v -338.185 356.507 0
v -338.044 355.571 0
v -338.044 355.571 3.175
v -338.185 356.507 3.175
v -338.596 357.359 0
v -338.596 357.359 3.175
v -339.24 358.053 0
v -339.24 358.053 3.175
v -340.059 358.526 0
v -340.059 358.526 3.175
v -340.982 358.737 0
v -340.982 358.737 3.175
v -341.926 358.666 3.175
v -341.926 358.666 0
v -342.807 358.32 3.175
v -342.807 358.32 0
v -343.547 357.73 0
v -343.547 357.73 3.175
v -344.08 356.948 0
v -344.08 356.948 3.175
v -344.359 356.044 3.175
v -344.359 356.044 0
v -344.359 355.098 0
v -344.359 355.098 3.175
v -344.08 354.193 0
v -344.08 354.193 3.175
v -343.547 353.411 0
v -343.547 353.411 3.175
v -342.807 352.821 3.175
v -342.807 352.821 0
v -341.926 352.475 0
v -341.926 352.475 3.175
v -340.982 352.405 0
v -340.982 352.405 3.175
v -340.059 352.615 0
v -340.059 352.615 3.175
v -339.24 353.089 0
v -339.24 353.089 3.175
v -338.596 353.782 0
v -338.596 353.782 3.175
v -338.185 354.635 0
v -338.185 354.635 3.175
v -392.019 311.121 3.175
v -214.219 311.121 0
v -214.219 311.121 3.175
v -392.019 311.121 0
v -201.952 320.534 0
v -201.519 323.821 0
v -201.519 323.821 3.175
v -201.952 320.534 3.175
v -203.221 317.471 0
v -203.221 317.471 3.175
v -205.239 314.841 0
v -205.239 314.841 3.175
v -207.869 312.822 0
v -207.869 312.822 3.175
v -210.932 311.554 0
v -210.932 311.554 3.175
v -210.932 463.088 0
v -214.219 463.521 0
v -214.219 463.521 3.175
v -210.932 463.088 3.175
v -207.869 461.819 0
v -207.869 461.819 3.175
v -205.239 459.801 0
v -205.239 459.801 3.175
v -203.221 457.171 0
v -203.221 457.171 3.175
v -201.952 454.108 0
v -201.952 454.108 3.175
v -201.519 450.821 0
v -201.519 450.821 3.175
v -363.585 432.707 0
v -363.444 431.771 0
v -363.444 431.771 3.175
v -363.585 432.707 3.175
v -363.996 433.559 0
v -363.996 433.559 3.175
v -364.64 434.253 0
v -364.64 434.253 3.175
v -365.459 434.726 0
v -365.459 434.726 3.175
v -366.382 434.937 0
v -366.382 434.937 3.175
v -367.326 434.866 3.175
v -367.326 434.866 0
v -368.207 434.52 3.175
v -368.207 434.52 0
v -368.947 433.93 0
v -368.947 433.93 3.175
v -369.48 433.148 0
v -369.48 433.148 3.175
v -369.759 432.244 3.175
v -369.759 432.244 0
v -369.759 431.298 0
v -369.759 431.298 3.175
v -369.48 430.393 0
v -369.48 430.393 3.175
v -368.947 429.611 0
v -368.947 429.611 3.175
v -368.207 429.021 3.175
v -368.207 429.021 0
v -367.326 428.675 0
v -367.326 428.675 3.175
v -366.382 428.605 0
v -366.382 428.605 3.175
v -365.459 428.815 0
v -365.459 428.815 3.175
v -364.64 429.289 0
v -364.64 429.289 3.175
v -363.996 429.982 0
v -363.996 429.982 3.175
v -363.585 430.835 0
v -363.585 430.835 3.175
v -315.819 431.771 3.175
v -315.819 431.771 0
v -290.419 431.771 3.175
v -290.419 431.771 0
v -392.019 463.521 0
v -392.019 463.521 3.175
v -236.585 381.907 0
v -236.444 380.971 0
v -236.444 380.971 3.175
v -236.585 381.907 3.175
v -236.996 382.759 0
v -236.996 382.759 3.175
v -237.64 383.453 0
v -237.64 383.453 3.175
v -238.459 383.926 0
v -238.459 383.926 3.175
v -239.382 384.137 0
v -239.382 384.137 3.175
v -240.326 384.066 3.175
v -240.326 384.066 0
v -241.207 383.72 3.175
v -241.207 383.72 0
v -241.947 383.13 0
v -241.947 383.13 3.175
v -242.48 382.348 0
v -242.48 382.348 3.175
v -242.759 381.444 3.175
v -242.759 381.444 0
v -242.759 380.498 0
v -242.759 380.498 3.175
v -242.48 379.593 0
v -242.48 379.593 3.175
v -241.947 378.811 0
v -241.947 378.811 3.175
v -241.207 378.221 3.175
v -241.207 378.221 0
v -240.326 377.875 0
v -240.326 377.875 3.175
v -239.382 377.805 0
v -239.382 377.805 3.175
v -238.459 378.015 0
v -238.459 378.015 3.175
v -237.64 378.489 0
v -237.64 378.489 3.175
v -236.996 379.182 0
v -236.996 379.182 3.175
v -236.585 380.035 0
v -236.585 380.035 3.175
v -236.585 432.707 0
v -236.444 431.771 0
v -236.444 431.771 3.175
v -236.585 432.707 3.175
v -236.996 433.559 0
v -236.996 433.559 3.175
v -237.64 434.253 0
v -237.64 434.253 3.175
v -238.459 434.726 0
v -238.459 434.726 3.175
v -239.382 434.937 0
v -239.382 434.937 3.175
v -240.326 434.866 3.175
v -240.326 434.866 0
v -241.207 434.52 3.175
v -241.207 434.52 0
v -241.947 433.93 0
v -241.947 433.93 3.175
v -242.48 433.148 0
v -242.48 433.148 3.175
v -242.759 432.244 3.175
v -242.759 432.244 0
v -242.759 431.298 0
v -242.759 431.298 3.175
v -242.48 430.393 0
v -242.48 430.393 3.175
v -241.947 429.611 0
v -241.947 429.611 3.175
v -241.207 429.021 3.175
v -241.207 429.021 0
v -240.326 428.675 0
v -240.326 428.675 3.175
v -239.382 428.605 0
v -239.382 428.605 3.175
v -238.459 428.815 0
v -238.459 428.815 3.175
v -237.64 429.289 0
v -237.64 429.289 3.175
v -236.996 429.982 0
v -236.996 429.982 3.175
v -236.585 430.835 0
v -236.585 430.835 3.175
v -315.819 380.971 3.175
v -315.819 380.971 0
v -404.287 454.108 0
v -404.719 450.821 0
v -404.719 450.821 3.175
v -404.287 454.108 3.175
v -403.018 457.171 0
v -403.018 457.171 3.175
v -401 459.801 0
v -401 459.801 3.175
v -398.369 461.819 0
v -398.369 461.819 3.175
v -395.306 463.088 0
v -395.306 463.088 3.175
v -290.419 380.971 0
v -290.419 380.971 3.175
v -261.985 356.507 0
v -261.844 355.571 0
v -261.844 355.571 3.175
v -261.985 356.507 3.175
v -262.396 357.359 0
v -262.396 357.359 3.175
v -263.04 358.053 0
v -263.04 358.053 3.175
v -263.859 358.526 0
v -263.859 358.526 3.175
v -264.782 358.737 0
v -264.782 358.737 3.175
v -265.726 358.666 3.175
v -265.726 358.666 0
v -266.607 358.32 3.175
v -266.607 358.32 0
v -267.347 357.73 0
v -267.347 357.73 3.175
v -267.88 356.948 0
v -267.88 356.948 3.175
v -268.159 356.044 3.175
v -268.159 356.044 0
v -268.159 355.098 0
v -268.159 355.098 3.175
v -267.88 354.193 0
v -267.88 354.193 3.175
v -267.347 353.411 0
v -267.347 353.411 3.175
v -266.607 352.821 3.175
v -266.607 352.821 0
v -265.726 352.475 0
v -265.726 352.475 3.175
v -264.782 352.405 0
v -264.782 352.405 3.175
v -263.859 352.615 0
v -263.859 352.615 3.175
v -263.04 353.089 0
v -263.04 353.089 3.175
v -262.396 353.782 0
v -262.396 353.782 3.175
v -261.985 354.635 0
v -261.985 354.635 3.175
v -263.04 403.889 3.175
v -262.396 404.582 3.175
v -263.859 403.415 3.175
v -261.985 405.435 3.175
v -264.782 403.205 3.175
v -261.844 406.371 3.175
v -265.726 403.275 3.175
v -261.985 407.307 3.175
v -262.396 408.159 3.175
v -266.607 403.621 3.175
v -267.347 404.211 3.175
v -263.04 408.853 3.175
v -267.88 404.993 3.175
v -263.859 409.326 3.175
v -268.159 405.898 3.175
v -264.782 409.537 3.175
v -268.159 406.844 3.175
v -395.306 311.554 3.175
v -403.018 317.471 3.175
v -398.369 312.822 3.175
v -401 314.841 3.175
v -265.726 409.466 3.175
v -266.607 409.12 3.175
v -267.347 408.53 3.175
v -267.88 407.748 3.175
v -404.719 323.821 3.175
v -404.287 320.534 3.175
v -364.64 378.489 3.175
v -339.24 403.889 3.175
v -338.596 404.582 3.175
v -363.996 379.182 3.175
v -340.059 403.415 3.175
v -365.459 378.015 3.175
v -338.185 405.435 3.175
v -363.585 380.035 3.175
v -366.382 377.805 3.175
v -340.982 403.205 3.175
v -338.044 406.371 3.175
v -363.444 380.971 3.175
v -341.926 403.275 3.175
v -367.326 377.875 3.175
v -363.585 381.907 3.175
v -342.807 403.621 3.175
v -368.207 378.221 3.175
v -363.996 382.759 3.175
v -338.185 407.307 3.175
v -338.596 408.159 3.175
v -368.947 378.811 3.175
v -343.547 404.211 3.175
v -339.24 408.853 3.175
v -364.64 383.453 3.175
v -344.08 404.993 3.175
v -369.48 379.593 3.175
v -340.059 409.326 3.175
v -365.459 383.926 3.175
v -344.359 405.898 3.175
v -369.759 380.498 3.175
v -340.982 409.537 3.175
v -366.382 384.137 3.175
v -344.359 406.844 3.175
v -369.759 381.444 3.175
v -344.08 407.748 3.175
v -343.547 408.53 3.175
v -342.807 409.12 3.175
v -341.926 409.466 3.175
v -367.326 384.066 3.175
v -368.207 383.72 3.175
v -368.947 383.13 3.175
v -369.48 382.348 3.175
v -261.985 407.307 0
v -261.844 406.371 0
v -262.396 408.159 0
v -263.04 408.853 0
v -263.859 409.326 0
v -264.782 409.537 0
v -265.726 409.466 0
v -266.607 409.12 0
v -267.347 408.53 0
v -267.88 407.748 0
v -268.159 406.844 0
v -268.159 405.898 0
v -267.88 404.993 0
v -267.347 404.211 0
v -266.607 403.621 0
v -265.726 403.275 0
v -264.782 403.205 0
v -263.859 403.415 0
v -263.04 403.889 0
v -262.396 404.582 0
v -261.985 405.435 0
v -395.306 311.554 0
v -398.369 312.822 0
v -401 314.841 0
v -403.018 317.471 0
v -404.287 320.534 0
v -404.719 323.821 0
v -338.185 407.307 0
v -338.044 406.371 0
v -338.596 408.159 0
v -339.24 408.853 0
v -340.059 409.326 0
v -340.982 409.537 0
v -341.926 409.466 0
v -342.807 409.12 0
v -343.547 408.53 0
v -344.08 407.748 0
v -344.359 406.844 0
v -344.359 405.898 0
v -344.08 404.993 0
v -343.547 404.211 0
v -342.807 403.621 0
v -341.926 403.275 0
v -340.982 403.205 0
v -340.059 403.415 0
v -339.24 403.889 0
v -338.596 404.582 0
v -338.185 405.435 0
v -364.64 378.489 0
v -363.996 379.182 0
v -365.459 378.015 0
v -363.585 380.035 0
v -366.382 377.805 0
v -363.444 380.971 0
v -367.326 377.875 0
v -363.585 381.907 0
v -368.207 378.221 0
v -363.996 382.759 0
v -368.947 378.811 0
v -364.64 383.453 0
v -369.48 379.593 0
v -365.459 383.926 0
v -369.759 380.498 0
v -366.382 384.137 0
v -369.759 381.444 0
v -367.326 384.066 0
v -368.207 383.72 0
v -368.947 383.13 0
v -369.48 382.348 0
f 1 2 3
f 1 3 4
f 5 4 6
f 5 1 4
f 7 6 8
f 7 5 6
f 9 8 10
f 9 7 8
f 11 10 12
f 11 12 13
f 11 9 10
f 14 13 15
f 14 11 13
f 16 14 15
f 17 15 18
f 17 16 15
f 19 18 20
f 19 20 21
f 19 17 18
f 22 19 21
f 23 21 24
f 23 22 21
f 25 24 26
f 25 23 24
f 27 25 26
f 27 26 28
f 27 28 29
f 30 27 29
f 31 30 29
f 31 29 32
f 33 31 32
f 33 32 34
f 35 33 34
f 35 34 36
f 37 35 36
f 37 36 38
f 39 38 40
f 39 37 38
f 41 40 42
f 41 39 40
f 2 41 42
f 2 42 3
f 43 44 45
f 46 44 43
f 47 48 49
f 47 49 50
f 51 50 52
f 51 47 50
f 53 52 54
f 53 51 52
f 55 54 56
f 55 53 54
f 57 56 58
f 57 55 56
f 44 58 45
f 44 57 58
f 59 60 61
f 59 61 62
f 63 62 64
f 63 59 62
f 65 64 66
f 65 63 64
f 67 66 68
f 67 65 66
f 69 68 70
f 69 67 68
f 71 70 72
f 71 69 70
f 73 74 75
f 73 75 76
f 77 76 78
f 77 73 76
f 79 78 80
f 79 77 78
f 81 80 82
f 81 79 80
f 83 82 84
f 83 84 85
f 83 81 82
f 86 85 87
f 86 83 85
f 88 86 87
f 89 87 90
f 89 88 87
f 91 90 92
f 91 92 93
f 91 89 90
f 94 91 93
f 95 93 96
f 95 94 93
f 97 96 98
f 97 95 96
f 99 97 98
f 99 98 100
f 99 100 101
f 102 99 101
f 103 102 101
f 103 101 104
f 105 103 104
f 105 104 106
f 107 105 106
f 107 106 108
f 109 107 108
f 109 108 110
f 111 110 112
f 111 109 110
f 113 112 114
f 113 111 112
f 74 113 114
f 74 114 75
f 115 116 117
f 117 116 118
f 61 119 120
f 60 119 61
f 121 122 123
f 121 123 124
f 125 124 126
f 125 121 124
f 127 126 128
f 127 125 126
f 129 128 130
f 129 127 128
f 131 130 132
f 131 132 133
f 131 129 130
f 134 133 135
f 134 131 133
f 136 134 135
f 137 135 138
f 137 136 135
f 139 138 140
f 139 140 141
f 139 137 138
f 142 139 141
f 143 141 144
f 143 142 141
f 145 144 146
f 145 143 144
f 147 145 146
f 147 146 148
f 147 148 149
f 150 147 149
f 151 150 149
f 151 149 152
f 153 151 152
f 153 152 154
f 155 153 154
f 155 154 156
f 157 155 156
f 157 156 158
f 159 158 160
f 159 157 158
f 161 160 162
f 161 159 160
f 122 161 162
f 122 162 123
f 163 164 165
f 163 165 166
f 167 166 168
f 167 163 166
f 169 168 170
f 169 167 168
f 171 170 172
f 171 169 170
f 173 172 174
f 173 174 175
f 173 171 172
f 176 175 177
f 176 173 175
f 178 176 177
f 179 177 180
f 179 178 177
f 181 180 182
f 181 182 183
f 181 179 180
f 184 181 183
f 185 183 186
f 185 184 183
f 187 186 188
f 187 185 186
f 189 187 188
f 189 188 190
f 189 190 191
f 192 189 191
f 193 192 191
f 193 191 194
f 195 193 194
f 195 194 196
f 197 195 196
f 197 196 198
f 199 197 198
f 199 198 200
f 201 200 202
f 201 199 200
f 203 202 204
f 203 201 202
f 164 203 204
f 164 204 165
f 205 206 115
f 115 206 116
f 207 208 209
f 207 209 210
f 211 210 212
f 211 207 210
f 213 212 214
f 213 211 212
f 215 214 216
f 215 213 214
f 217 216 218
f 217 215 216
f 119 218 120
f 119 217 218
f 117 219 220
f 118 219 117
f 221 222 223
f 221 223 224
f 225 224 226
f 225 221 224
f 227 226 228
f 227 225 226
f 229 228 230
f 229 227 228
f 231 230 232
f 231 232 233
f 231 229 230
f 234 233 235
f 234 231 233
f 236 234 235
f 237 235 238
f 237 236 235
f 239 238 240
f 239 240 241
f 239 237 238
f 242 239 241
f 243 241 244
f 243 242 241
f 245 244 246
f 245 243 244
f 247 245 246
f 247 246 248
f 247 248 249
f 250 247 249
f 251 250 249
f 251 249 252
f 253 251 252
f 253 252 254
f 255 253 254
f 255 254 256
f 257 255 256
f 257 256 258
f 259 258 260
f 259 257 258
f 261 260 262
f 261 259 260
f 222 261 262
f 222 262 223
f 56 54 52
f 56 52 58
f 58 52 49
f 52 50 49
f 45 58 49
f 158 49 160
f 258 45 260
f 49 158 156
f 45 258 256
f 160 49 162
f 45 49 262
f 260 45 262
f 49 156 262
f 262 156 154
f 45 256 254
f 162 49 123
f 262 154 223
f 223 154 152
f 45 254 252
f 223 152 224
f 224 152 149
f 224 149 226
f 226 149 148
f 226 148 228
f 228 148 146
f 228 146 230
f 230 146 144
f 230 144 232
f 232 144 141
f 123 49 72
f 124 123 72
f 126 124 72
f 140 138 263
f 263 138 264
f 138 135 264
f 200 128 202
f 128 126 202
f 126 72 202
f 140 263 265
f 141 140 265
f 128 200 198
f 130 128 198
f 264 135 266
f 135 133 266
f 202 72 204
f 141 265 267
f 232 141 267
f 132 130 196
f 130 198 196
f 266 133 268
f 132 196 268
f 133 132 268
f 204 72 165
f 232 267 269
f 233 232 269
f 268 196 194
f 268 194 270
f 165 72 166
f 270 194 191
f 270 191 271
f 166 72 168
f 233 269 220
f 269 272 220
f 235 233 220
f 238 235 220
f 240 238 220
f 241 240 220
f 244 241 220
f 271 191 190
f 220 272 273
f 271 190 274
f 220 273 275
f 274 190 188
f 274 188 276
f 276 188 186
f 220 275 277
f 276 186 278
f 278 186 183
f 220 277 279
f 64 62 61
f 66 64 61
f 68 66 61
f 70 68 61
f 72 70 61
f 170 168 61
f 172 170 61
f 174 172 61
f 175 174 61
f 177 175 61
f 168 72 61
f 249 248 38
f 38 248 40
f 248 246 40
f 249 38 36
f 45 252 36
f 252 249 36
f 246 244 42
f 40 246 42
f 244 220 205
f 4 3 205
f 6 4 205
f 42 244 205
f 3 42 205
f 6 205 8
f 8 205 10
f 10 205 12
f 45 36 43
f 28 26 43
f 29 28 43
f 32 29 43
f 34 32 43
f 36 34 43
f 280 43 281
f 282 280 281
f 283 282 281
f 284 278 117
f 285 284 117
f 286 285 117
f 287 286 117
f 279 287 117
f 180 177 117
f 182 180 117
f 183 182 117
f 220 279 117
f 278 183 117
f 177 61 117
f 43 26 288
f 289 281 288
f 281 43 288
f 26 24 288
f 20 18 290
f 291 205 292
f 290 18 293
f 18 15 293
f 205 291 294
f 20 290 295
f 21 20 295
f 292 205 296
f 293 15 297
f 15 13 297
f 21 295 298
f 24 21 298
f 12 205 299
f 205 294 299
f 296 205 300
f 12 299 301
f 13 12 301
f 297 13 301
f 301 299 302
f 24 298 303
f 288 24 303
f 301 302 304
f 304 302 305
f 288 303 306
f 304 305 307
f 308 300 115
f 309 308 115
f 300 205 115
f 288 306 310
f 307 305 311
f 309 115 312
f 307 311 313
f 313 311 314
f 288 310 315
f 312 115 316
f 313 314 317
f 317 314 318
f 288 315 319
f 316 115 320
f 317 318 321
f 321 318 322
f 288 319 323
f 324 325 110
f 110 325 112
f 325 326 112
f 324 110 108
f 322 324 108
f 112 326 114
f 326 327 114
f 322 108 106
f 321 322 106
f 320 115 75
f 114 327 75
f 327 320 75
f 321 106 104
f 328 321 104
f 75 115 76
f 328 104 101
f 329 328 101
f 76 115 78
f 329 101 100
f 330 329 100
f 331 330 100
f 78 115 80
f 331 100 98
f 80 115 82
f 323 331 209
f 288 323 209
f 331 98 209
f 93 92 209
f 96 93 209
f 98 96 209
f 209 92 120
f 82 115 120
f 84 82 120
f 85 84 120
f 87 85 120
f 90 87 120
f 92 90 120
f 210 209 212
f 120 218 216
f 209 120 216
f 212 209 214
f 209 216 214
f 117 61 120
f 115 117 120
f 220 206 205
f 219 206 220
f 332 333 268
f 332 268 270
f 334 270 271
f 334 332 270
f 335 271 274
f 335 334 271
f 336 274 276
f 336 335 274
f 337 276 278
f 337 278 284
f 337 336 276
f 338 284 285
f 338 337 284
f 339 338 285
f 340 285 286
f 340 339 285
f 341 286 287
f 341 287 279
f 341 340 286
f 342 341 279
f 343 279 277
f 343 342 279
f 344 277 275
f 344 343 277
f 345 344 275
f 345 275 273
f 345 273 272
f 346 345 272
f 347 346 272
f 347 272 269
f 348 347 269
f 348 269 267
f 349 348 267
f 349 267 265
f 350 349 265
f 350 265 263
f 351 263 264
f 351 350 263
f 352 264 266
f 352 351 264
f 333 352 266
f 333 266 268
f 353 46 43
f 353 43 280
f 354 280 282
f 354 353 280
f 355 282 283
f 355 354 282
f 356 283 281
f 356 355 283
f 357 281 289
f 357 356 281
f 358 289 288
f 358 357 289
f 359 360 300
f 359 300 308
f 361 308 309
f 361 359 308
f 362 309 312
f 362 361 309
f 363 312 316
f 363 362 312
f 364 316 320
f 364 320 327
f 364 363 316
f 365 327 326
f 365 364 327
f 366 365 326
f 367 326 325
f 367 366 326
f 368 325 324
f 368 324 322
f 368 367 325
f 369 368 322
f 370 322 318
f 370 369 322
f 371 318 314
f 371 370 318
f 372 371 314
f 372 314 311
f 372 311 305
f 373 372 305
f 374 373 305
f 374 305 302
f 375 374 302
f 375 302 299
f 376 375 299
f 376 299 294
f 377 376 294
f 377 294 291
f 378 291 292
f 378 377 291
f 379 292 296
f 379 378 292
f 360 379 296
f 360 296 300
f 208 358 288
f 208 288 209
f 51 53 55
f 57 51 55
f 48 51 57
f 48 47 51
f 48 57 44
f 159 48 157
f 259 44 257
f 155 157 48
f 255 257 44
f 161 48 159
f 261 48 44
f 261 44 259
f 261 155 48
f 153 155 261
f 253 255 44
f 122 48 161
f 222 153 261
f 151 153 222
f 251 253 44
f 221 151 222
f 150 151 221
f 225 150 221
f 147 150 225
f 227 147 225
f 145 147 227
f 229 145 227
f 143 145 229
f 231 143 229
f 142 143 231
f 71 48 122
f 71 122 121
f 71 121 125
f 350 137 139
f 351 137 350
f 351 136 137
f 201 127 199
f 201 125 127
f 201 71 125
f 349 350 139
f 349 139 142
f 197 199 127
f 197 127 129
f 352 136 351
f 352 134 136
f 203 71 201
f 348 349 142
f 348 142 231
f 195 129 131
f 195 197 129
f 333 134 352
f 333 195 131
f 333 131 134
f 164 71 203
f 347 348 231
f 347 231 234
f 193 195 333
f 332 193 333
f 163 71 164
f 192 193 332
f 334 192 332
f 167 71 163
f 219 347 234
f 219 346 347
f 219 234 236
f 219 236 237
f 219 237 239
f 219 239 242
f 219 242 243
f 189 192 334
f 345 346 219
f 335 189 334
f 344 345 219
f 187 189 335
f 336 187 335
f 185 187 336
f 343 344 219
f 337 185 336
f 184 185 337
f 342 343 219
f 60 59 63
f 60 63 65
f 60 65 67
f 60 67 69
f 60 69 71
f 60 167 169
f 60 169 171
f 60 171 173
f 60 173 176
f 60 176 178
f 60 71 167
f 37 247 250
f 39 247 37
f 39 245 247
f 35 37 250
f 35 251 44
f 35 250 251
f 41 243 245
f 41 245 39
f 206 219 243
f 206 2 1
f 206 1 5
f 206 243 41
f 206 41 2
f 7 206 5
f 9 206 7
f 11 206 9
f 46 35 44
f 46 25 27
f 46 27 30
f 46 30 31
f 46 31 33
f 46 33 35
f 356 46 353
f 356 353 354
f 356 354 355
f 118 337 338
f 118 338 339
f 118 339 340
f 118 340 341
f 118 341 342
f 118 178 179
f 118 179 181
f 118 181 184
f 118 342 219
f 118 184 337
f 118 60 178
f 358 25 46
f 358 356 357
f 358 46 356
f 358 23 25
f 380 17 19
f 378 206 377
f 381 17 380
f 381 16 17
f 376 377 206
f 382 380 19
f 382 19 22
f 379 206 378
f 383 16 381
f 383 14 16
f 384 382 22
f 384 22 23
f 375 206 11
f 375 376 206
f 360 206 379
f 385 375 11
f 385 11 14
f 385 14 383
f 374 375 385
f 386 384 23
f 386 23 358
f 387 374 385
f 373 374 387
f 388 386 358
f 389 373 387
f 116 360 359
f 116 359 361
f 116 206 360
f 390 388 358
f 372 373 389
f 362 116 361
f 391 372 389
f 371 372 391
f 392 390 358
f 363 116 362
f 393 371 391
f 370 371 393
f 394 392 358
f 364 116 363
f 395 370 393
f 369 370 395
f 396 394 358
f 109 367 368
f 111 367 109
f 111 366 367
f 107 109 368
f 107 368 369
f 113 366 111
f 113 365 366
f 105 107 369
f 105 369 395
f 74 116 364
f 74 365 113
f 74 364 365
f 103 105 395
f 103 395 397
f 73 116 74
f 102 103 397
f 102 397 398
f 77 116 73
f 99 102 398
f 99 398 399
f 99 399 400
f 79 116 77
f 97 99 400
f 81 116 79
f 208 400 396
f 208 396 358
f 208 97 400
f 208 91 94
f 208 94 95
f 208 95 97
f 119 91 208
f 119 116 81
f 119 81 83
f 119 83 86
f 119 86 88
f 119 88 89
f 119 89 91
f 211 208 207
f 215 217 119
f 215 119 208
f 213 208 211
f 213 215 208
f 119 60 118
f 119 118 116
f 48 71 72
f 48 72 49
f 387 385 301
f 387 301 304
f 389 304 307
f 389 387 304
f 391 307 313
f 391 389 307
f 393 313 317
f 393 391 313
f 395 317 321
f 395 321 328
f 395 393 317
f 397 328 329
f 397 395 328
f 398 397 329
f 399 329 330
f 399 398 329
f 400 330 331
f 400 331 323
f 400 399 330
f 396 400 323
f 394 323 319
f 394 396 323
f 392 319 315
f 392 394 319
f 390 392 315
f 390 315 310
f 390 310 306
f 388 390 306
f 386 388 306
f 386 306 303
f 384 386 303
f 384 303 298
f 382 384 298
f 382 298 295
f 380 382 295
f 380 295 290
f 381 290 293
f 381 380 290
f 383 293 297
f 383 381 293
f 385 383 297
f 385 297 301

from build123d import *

# Parameters (mm, degrees)
SKETCH1_R           = 3.175
SKETCH1_W           = 25.4
SKETCH1_H           = 50.8
BOSS_EXTRUDE1_DEPTH = 3.175


with BuildPart() as part:
    # Sketch1 → Boss-Extrude1 (new body)
    with BuildSketch(Plane.XY):
        with BuildLine():
            Line((-392.019369126, 463.520831078), (-214.219369126, 463.520831078))
            ThreePointArc((-214.219369126, 463.520831078), (-205.239113005, 459.801087199), (-201.519369126, 450.820831078))
            Line((-201.519369126, 450.820831078), (-201.519369126, 323.820831078))
            ThreePointArc((-201.519369126, 323.820831078), (-205.239113005, 314.840574957), (-214.219369126, 311.120831078))
            Line((-214.219369126, 311.120831078), (-392.019369126, 311.120831078))
            ThreePointArc((-392.019369126, 311.120831078), (-400.999625247, 314.840574957), (-404.719369126, 323.820831078))
            Line((-404.719369126, 323.820831078), (-404.719369126, 450.820831078))
            ThreePointArc((-404.719369126, 450.820831078), (-400.999625247, 459.801087199), (-392.019369126, 463.520831078))
        make_face()
        with Locations((-239.619369126, 431.770831078)):
            Circle(SKETCH1_R, mode=Mode.SUBTRACT)
        with Locations((-239.619369126, 380.970831078)):
            Circle(SKETCH1_R, mode=Mode.SUBTRACT)
        with Locations((-265.019369126, 406.370831078)):
            Circle(SKETCH1_R, mode=Mode.SUBTRACT)
        with Locations((-366.619369126, 380.970831078)):
            Circle(SKETCH1_R, mode=Mode.SUBTRACT)
        with Locations((-341.219369126, 406.370831078)):
            Circle(SKETCH1_R, mode=Mode.SUBTRACT)
        with Locations((-366.619369126, 431.770831078)):
            Circle(SKETCH1_R, mode=Mode.SUBTRACT)
        with Locations((-265.019369126, 355.570831078)):
            Circle(SKETCH1_R, mode=Mode.SUBTRACT)
        with Locations((-341.219369126, 355.570831078)):
            Circle(SKETCH1_R, mode=Mode.SUBTRACT)
        with Locations((-303.119369126, 406.370831078)):
            Rectangle(SKETCH1_W, SKETCH1_H, mode=Mode.SUBTRACT)
    extrude(amount=BOSS_EXTRUDE1_DEPTH)


solid = part.part
